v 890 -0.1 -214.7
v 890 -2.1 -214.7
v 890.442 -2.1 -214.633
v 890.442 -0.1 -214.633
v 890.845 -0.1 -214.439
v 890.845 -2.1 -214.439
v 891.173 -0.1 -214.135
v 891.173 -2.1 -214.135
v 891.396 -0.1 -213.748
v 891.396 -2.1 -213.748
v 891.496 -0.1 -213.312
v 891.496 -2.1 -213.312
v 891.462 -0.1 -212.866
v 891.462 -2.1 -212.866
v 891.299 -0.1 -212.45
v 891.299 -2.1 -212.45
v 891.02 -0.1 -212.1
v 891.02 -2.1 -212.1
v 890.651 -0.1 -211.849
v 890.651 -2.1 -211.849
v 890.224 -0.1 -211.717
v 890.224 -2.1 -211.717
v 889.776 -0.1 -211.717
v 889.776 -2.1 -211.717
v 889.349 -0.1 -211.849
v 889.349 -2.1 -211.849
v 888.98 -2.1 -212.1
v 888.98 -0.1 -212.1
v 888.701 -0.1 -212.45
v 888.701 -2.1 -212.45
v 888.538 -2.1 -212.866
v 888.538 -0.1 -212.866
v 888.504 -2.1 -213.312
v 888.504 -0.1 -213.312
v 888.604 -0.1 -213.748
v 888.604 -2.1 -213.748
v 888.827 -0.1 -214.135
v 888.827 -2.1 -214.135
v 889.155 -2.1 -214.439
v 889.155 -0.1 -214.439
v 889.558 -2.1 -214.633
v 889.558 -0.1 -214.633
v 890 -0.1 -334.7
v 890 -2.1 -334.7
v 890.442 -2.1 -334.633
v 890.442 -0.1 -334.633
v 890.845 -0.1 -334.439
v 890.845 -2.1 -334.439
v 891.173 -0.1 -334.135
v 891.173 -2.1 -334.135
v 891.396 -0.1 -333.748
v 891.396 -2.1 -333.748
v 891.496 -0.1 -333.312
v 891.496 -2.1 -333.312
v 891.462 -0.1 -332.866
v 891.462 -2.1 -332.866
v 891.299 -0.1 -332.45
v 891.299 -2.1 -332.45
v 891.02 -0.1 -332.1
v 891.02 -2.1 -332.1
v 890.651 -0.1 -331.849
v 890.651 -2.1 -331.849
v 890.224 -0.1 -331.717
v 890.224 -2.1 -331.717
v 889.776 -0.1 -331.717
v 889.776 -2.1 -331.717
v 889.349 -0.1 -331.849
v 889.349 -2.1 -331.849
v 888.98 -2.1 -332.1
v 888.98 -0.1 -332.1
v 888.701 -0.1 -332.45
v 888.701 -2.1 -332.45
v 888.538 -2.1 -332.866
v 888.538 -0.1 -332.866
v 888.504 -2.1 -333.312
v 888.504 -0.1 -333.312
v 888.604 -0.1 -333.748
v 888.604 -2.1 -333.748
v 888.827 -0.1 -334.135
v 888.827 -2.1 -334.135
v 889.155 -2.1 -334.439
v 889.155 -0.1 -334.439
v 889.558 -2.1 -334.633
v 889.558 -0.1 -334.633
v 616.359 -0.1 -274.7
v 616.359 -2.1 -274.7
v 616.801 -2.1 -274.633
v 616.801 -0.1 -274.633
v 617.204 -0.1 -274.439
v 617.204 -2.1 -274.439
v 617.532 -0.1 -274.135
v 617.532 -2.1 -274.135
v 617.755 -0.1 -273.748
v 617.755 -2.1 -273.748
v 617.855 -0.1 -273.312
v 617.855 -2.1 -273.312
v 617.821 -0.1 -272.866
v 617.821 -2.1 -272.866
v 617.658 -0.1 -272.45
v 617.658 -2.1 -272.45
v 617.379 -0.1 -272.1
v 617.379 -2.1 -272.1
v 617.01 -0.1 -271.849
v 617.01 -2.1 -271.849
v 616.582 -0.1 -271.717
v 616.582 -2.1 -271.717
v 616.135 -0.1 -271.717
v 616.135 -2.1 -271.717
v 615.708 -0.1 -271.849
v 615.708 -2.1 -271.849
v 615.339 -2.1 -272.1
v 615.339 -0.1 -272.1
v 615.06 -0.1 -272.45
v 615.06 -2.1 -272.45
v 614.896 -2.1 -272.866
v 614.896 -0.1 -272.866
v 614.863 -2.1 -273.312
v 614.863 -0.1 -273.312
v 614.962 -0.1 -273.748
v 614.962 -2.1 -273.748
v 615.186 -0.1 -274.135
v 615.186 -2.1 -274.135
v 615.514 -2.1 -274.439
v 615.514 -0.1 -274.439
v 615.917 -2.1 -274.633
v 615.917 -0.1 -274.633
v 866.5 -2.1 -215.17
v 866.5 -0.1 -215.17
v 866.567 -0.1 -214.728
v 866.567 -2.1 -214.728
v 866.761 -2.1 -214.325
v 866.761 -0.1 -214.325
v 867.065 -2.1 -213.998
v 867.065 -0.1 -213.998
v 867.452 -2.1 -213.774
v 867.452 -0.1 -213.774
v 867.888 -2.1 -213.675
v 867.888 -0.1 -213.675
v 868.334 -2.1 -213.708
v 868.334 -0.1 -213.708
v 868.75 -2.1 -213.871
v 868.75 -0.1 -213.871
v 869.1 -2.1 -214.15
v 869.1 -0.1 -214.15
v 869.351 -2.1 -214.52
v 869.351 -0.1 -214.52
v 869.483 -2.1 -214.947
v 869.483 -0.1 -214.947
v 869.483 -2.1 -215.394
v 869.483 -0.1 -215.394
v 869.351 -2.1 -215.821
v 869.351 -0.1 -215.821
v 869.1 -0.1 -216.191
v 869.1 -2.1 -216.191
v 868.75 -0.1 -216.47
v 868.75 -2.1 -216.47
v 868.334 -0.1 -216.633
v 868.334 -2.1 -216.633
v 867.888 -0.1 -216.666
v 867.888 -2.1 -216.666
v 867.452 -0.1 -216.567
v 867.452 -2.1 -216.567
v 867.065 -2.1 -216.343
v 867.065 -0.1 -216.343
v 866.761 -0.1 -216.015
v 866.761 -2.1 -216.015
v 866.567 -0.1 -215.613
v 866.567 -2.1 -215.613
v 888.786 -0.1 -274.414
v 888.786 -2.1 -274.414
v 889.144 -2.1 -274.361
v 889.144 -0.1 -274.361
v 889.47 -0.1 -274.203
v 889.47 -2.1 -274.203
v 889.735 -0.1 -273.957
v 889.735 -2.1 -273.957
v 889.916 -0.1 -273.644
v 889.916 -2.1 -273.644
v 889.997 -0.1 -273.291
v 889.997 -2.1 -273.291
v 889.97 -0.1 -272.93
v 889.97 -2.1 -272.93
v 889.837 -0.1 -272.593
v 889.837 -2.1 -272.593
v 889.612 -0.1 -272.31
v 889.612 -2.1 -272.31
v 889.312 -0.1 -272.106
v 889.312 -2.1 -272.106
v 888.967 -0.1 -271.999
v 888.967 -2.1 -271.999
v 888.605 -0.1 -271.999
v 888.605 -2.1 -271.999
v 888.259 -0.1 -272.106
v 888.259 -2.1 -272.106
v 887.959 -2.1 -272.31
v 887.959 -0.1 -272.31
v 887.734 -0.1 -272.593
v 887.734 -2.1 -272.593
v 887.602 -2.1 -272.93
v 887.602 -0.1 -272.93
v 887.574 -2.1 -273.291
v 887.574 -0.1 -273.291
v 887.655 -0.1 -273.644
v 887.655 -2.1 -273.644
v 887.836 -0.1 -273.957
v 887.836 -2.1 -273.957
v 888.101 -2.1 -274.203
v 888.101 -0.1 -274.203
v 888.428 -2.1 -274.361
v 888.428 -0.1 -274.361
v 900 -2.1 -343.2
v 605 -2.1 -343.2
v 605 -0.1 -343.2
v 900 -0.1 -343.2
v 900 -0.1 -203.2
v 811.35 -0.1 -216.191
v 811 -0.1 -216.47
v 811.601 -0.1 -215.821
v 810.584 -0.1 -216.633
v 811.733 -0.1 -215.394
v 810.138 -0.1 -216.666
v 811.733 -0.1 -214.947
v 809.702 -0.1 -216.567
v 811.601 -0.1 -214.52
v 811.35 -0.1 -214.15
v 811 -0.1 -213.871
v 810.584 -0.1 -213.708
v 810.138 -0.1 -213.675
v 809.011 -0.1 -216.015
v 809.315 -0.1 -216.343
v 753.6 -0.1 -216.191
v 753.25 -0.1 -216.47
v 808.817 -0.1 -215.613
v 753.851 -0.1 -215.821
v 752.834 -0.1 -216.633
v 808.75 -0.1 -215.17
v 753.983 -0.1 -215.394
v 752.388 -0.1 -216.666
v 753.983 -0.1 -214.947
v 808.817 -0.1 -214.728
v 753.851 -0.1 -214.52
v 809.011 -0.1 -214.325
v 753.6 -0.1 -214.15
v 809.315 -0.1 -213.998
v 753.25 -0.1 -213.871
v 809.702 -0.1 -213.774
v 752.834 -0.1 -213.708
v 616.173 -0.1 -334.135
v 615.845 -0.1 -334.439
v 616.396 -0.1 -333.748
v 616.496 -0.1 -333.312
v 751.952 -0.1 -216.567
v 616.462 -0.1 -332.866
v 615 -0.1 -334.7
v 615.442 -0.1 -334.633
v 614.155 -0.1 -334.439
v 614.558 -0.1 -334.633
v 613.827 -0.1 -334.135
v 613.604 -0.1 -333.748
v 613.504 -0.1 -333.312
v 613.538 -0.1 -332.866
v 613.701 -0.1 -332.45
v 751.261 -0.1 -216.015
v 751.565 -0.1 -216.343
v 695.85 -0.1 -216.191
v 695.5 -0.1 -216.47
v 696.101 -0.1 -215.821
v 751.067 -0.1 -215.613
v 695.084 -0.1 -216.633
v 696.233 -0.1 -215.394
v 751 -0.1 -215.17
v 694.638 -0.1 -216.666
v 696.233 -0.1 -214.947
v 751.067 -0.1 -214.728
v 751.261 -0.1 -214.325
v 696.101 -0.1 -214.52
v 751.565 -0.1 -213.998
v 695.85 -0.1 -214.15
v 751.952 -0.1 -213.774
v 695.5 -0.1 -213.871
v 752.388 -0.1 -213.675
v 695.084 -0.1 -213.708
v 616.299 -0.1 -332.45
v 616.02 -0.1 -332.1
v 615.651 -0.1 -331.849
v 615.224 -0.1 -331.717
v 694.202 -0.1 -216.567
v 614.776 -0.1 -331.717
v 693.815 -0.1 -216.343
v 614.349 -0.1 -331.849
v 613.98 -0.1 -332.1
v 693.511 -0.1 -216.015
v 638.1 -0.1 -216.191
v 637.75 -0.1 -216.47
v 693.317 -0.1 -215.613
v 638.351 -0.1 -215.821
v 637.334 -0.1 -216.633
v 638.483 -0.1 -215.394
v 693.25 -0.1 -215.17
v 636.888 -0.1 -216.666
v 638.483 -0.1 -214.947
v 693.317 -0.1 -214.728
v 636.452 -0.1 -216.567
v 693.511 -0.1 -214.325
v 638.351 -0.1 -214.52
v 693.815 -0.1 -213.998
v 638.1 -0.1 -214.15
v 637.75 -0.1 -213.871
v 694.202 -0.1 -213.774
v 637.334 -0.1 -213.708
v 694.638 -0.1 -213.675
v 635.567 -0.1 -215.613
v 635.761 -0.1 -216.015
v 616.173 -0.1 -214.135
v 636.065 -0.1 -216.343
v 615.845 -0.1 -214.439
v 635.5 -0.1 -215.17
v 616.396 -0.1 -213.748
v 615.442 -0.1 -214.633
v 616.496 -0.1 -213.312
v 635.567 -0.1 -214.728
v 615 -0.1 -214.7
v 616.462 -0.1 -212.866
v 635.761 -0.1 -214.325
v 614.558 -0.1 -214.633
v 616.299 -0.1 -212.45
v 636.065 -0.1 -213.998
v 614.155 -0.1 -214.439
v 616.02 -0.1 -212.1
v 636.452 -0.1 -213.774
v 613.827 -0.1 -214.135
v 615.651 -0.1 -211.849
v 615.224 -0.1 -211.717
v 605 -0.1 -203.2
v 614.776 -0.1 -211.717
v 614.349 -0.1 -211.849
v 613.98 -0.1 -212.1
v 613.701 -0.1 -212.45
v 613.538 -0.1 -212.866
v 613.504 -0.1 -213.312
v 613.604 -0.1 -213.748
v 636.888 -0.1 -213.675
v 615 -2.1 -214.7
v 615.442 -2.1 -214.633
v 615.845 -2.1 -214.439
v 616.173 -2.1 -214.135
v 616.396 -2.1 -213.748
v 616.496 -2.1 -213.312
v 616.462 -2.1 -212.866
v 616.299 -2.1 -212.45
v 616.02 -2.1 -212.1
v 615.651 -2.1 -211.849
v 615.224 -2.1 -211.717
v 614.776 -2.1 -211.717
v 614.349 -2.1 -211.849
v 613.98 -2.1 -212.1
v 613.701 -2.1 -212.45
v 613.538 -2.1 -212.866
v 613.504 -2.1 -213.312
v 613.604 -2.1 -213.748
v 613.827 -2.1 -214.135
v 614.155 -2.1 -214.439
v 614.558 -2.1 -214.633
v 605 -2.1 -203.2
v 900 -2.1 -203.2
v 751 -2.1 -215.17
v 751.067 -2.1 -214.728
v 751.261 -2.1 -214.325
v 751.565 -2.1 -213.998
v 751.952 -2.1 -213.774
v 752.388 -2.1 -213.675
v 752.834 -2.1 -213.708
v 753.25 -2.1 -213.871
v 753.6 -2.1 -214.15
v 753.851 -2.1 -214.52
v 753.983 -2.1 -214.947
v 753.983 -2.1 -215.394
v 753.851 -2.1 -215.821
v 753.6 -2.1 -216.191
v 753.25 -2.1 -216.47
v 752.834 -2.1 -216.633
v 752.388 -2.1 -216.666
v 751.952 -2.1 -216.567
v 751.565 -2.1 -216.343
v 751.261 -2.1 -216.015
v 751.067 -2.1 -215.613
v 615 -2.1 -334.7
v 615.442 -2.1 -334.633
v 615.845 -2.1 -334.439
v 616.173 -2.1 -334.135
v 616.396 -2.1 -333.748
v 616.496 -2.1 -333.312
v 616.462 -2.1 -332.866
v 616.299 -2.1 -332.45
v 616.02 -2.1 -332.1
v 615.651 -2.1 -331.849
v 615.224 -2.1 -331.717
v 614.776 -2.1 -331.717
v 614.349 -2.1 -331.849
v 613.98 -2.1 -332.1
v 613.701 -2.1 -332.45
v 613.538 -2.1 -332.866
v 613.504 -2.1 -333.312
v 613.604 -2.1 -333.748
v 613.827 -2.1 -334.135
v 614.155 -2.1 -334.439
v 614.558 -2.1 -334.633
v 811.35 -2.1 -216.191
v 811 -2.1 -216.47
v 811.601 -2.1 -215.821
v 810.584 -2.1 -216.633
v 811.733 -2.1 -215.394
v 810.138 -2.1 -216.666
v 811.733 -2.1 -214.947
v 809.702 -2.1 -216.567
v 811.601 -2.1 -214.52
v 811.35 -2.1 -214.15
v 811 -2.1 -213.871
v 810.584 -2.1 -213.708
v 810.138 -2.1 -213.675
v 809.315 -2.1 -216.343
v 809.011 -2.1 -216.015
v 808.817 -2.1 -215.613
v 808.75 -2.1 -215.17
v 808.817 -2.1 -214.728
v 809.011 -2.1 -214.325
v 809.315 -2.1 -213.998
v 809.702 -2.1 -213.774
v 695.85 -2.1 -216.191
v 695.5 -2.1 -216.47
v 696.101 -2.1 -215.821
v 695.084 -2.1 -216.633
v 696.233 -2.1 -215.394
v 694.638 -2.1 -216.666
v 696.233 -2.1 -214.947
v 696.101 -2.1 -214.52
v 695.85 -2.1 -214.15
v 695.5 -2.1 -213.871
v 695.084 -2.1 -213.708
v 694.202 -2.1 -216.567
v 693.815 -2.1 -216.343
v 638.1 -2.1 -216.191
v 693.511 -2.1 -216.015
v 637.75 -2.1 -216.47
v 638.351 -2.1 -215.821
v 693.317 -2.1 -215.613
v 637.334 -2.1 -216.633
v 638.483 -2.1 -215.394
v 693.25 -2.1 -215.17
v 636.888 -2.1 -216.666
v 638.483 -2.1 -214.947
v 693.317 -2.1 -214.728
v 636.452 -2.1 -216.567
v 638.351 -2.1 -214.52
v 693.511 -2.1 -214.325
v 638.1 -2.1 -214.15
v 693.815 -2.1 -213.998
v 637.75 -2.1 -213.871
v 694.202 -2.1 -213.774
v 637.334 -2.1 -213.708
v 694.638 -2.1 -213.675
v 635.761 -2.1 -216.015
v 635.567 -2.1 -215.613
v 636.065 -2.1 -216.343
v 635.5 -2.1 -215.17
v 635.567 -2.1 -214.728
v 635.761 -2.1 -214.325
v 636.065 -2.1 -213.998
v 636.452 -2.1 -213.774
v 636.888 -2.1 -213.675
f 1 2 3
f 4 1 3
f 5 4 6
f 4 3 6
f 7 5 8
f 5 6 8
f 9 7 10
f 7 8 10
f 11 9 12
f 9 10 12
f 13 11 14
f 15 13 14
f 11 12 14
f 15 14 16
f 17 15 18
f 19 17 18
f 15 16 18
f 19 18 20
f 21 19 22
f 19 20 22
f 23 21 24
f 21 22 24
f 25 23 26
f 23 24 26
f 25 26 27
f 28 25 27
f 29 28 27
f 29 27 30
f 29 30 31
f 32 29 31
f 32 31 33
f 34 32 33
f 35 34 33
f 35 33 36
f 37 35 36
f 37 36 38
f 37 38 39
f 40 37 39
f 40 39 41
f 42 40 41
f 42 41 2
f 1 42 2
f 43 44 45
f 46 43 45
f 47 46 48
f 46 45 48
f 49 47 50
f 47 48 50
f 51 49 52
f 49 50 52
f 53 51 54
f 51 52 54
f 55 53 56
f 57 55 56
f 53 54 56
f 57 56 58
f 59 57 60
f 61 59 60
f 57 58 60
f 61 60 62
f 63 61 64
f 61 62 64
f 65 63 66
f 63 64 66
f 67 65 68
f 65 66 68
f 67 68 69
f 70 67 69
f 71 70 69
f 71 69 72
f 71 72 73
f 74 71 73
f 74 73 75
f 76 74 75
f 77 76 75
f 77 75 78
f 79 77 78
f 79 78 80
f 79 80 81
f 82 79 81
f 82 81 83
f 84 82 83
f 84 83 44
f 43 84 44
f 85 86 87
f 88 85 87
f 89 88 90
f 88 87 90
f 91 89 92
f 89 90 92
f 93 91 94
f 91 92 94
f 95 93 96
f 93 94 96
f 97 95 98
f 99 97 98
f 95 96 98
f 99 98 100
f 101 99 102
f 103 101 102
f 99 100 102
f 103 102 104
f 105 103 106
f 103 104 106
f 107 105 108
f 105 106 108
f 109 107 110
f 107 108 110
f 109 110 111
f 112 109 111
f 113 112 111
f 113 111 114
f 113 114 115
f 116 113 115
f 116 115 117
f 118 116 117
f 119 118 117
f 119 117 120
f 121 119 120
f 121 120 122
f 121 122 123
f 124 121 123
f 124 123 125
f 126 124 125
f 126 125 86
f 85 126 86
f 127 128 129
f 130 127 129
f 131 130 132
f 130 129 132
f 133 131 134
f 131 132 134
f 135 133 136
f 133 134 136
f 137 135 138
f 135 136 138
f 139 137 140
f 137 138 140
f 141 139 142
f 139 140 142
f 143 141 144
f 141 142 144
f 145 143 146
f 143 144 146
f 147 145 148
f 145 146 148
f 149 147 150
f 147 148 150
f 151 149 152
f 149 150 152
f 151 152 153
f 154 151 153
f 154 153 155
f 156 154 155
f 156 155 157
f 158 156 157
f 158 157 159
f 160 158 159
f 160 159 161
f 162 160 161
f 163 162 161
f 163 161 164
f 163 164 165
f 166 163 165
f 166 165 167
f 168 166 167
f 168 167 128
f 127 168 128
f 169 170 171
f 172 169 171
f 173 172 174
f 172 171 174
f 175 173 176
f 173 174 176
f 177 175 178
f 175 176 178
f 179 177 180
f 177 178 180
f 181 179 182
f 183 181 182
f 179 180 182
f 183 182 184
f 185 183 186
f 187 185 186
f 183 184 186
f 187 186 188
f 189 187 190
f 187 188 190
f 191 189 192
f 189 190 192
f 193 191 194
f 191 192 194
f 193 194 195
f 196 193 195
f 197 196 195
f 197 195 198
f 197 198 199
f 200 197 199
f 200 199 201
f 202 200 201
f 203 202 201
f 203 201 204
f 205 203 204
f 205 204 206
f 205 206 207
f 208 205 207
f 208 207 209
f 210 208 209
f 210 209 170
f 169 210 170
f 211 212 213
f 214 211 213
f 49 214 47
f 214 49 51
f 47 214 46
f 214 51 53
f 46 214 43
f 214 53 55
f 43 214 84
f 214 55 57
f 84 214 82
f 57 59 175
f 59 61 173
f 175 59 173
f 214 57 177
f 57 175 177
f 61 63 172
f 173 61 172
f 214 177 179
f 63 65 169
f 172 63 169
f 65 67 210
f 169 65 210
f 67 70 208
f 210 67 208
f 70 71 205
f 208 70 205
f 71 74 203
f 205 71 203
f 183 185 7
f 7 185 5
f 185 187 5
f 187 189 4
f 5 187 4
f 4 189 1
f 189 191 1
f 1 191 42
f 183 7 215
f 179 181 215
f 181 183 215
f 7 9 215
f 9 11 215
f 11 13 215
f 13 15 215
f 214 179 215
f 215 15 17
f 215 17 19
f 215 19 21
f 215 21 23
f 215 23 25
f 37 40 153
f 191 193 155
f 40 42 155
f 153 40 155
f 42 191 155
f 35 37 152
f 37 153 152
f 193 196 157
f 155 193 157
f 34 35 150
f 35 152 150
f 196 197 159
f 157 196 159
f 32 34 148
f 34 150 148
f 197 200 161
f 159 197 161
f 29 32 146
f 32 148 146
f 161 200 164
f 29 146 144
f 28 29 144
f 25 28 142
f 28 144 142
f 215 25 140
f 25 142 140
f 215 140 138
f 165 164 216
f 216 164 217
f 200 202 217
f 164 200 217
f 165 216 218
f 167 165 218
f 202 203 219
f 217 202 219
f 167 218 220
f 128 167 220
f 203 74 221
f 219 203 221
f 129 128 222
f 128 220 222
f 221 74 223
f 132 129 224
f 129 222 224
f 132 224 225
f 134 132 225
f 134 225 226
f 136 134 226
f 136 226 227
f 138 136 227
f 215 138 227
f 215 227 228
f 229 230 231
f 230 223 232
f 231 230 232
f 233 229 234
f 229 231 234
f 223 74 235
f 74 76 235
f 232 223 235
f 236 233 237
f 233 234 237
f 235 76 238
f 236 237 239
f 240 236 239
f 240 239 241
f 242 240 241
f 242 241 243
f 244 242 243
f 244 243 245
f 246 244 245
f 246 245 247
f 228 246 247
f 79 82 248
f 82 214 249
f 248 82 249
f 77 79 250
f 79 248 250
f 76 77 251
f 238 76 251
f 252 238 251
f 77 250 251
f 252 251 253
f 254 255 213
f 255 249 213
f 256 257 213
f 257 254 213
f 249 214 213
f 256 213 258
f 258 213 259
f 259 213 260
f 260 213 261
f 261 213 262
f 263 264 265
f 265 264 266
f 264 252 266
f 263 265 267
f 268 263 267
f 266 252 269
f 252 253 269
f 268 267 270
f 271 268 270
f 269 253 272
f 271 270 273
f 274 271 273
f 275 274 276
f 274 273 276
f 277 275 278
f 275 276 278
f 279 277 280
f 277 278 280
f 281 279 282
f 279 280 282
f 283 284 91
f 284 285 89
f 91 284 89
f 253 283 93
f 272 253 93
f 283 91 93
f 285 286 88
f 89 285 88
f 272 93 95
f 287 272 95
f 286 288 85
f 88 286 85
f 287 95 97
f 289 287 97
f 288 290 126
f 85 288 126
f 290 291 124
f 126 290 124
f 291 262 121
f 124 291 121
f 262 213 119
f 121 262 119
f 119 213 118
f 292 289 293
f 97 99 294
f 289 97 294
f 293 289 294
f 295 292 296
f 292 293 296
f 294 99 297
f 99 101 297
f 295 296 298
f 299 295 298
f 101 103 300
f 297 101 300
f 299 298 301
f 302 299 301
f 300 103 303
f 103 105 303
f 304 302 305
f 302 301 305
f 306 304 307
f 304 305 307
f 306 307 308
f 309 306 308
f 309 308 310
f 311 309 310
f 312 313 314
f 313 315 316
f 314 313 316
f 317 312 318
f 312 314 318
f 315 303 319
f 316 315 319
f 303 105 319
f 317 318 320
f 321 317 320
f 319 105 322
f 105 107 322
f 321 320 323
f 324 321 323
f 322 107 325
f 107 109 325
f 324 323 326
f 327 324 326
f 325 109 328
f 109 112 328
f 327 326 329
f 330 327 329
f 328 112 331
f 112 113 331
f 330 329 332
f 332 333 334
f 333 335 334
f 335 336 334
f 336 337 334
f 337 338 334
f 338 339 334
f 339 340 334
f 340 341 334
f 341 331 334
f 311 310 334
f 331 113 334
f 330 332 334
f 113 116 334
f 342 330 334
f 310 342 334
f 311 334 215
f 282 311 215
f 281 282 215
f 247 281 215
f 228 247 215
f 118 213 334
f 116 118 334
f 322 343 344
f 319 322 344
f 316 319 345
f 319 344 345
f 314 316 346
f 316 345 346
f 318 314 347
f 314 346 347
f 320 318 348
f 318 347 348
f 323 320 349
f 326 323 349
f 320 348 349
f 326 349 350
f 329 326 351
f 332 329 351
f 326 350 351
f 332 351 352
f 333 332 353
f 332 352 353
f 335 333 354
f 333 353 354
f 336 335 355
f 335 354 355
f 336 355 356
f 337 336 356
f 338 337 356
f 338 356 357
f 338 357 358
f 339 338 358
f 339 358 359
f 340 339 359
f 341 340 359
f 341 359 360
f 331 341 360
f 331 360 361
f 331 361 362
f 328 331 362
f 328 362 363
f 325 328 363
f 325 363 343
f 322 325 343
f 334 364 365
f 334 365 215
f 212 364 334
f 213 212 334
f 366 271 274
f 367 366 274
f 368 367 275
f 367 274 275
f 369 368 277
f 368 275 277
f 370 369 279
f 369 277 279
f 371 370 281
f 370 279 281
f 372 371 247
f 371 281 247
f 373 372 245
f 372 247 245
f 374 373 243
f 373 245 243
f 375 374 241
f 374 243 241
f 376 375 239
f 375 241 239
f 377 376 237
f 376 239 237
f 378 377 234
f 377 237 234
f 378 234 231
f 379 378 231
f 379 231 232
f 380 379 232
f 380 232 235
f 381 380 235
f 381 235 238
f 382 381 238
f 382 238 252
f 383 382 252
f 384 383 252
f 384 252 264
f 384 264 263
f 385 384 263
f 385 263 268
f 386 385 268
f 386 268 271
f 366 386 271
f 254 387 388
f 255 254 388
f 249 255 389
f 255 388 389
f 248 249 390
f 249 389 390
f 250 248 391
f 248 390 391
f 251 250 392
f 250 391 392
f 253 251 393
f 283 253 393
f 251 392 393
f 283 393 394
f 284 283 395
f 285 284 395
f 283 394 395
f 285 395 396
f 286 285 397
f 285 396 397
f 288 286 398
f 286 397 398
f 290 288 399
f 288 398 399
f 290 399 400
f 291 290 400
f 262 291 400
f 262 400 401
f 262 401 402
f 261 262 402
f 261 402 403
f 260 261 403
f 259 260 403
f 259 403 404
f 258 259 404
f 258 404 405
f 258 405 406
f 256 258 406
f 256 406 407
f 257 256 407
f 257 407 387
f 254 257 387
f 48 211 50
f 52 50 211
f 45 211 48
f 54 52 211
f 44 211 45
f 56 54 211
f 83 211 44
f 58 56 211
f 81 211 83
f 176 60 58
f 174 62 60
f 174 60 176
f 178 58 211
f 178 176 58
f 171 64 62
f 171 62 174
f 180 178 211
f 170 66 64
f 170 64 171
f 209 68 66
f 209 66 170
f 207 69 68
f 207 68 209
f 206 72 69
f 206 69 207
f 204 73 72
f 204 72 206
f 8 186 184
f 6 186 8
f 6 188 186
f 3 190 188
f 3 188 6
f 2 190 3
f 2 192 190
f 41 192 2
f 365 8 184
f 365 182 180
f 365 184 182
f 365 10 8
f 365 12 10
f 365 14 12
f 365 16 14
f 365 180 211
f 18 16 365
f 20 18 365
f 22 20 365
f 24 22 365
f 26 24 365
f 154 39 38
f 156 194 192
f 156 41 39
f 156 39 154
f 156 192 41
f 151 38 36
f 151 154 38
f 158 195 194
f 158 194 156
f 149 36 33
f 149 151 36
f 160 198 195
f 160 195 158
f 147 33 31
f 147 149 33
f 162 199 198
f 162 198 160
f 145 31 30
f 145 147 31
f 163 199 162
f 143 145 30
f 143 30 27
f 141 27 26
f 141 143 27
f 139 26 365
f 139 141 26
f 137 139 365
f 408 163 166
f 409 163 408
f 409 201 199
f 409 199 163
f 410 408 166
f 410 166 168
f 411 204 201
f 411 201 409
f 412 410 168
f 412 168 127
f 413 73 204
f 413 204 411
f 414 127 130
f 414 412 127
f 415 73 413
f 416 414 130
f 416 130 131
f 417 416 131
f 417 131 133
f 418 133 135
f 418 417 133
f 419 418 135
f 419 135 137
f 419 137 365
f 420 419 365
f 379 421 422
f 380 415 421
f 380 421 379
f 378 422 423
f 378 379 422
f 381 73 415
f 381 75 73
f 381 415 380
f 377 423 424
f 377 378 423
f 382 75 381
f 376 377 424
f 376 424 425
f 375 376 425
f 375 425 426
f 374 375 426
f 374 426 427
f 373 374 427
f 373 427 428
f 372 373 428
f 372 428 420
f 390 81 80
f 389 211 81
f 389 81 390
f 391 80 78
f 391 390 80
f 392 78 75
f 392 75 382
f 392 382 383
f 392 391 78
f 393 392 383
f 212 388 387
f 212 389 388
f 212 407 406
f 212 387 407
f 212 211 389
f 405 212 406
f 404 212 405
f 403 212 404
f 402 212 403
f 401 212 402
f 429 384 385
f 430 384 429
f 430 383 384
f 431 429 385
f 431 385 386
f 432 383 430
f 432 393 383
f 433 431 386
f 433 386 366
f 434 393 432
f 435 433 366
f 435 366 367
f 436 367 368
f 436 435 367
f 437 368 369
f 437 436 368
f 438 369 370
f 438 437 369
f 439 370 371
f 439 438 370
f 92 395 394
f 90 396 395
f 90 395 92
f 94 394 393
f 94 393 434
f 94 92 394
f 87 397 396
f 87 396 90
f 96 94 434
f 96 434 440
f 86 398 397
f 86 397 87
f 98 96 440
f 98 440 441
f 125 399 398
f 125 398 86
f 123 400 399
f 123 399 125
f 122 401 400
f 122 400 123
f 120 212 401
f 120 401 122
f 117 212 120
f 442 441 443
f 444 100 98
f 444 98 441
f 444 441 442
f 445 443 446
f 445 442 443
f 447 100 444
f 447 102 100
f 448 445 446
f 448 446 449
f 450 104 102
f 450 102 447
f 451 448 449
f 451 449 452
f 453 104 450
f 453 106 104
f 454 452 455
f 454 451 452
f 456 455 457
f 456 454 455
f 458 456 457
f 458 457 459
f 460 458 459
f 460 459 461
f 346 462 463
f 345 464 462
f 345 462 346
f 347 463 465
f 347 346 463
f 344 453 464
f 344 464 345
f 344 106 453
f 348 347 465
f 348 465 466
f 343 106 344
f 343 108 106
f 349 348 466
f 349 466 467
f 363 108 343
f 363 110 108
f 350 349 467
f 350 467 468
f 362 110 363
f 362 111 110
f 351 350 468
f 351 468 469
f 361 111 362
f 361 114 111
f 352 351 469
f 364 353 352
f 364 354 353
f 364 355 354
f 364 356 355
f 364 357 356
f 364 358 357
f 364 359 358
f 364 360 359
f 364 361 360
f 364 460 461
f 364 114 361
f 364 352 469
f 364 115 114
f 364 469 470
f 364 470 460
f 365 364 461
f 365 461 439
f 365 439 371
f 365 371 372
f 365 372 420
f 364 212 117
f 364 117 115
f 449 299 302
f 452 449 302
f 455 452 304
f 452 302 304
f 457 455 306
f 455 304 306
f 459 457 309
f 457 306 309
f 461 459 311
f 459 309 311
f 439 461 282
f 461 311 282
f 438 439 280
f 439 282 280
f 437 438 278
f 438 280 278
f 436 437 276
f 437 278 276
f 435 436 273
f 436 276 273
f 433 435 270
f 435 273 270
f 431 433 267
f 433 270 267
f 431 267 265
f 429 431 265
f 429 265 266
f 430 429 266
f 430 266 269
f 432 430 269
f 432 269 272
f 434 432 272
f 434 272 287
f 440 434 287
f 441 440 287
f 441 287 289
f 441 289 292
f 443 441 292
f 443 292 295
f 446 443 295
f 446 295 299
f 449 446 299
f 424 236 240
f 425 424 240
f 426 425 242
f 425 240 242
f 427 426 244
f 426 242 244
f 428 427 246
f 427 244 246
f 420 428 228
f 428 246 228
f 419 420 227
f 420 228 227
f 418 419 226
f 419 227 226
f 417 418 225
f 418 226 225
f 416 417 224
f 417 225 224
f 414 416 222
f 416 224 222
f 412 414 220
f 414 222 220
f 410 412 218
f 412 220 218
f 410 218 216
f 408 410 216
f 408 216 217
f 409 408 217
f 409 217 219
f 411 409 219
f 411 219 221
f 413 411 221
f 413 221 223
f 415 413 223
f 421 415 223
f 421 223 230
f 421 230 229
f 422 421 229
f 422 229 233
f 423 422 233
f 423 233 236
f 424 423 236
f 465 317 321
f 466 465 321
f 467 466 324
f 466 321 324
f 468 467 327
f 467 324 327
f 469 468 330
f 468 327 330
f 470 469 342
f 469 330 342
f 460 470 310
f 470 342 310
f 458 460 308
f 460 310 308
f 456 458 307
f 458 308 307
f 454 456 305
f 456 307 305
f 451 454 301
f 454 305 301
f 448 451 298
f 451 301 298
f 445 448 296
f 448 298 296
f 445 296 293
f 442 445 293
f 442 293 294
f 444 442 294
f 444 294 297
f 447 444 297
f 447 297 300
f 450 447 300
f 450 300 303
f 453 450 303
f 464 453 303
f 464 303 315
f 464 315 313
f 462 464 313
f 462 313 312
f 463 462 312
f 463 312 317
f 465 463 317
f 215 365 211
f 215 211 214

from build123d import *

# Parameters (mm, degrees)
SKETCH005_W     = 2
SKETCH005_H     = 140
PAD002_DEPTH    = 295
SKETCH019_R     = 1.5
SKETCH019_R_2   = 1.21447
POCKET008_DEPTH = 5
SKETCH097_R     = 1.5
POCKET055_DEPTH = 5


with BuildPart() as part:
    # Sketch005 → Pad002 (new body)
    with BuildSketch(Plane.YZ):
        with Locations((1, 70)):
            Rectangle(SKETCH005_W, SKETCH005_H)
    extrude(amount=PAD002_DEPTH)

    # Sketch019 (on Face1 of Pad002) → Pocket008 (cut)
    with BuildSketch(Plane(origin=(0, 0, 0), x_dir=(0, 0, -1), z_dir=(0, -1, 0))):
        with Locations((-130, 285)):
            Circle(SKETCH019_R)
        with Locations((-10, 285)):
            Circle(SKETCH019_R)
        with Locations((-70, 283.78553)):
            Circle(SKETCH019_R_2)
        with Locations((-10, 10)):
            Circle(SKETCH019_R)
        with Locations((-70, 11.35879)):
            Circle(SKETCH019_R)
        with Locations((-130, 10)):
            Circle(SKETCH019_R)
    extrude(amount=-POCKET008_DEPTH, mode=Mode.SUBTRACT)

    # Sketch097 (on Face1 of Binder037) → Pocket055 (cut)
    with BuildSketch(Plane(origin=(0, 4, 0), x_dir=(-1, 0, 0), z_dir=(0, 1, 0))):
        with Locations((-32, 128.029529)):
            Circle(SKETCH097_R)
        with Locations((-89.75, 128.029529)):
            Circle(SKETCH097_R)
        with Locations((-147.5, 128.029529)):
            Circle(SKETCH097_R)
        with Locations((-205.25, 128.029529)):
            Circle(SKETCH097_R)
        with Locations((-263, 128.029529)):
            Circle(SKETCH097_R)
    extrude(amount=-POCKET055_DEPTH, mode=Mode.SUBTRACT)


with BuildPart() as part_1:
    # Body001 placement: moved
    add(part.part.moved(Location((605, -2.1, -343.2))))


solid = part_1.part
